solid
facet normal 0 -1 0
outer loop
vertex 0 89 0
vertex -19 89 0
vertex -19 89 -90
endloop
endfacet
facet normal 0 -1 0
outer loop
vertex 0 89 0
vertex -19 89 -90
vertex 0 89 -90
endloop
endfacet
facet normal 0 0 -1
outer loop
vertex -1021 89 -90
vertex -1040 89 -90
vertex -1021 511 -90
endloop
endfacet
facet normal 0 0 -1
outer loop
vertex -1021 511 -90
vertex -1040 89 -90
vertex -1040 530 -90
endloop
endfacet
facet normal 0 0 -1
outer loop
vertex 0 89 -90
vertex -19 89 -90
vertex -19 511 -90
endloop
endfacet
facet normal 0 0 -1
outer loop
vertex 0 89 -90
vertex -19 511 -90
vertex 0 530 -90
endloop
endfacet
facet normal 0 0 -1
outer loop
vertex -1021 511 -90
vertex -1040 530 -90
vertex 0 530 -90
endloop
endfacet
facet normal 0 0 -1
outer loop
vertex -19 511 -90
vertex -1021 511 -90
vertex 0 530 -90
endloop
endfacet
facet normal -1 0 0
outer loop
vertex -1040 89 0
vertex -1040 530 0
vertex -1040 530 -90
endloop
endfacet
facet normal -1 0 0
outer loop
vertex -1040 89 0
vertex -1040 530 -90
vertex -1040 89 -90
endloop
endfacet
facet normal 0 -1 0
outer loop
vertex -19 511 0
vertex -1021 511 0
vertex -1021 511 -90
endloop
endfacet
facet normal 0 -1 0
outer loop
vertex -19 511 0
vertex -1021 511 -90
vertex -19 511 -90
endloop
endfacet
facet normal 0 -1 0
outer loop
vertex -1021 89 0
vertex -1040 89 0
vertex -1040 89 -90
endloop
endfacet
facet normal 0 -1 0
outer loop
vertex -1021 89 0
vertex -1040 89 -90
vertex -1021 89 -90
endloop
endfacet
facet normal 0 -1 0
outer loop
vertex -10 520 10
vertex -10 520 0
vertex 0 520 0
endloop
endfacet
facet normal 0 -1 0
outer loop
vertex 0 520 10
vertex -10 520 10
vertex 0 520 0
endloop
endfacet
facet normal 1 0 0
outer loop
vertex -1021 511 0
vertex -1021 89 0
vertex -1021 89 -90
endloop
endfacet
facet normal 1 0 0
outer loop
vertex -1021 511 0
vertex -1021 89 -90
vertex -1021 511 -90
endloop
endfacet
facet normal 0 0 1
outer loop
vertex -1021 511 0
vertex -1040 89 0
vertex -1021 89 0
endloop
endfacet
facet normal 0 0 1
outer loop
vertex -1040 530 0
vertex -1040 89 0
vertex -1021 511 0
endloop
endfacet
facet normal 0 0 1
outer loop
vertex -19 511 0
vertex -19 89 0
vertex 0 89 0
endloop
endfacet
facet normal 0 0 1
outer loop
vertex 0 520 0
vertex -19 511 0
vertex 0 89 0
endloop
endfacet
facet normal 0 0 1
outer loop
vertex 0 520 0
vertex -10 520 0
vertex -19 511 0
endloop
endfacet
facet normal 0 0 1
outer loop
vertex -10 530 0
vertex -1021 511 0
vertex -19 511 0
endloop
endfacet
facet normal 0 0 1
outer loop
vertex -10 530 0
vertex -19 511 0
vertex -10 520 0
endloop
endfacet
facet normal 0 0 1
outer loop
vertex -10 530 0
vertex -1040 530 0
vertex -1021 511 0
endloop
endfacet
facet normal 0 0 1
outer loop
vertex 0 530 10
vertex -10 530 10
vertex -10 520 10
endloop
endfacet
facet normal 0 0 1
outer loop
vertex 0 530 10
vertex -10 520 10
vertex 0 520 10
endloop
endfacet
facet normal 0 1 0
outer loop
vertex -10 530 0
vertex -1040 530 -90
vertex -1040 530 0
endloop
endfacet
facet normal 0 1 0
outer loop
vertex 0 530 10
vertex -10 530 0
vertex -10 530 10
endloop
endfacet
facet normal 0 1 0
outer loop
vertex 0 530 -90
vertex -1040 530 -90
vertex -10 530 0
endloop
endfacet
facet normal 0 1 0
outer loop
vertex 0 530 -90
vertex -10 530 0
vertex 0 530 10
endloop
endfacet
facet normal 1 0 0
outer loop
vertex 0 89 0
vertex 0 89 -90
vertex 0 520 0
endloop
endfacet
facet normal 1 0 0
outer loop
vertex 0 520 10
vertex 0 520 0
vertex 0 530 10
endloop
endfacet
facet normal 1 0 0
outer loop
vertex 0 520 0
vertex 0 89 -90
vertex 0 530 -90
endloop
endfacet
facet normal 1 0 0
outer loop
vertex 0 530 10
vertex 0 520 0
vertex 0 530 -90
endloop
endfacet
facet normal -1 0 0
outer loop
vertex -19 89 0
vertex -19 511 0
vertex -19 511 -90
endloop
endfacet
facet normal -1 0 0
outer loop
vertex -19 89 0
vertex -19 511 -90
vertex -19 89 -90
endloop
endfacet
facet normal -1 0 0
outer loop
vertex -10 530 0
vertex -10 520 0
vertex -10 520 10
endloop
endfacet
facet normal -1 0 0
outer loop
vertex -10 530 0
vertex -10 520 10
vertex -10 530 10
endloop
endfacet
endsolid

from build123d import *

# Parameters (mm, degrees)
F1_DEPTH = 90
F2_W     = 10
F2_H     = 10
F3_DEPTH = 10


with BuildPart() as f1:
    # F0 (on Top) → F1 (new body)
    with BuildSketch(Plane.XY):
        Polygon((-19, 89), (0, 89), (0, 530), (-1040, 530), (-1040, 89), (-1021, 89), (-1021, 511), (-19, 511), align=None)
    extrude(amount=-F1_DEPTH)

    # F2 (on Top) → F3 (join)
    with BuildSketch(Plane.XY):
        with Locations((-5, 525)):
            Rectangle(F2_W, F2_H)
    extrude(amount=F3_DEPTH)


solid = f1.part
